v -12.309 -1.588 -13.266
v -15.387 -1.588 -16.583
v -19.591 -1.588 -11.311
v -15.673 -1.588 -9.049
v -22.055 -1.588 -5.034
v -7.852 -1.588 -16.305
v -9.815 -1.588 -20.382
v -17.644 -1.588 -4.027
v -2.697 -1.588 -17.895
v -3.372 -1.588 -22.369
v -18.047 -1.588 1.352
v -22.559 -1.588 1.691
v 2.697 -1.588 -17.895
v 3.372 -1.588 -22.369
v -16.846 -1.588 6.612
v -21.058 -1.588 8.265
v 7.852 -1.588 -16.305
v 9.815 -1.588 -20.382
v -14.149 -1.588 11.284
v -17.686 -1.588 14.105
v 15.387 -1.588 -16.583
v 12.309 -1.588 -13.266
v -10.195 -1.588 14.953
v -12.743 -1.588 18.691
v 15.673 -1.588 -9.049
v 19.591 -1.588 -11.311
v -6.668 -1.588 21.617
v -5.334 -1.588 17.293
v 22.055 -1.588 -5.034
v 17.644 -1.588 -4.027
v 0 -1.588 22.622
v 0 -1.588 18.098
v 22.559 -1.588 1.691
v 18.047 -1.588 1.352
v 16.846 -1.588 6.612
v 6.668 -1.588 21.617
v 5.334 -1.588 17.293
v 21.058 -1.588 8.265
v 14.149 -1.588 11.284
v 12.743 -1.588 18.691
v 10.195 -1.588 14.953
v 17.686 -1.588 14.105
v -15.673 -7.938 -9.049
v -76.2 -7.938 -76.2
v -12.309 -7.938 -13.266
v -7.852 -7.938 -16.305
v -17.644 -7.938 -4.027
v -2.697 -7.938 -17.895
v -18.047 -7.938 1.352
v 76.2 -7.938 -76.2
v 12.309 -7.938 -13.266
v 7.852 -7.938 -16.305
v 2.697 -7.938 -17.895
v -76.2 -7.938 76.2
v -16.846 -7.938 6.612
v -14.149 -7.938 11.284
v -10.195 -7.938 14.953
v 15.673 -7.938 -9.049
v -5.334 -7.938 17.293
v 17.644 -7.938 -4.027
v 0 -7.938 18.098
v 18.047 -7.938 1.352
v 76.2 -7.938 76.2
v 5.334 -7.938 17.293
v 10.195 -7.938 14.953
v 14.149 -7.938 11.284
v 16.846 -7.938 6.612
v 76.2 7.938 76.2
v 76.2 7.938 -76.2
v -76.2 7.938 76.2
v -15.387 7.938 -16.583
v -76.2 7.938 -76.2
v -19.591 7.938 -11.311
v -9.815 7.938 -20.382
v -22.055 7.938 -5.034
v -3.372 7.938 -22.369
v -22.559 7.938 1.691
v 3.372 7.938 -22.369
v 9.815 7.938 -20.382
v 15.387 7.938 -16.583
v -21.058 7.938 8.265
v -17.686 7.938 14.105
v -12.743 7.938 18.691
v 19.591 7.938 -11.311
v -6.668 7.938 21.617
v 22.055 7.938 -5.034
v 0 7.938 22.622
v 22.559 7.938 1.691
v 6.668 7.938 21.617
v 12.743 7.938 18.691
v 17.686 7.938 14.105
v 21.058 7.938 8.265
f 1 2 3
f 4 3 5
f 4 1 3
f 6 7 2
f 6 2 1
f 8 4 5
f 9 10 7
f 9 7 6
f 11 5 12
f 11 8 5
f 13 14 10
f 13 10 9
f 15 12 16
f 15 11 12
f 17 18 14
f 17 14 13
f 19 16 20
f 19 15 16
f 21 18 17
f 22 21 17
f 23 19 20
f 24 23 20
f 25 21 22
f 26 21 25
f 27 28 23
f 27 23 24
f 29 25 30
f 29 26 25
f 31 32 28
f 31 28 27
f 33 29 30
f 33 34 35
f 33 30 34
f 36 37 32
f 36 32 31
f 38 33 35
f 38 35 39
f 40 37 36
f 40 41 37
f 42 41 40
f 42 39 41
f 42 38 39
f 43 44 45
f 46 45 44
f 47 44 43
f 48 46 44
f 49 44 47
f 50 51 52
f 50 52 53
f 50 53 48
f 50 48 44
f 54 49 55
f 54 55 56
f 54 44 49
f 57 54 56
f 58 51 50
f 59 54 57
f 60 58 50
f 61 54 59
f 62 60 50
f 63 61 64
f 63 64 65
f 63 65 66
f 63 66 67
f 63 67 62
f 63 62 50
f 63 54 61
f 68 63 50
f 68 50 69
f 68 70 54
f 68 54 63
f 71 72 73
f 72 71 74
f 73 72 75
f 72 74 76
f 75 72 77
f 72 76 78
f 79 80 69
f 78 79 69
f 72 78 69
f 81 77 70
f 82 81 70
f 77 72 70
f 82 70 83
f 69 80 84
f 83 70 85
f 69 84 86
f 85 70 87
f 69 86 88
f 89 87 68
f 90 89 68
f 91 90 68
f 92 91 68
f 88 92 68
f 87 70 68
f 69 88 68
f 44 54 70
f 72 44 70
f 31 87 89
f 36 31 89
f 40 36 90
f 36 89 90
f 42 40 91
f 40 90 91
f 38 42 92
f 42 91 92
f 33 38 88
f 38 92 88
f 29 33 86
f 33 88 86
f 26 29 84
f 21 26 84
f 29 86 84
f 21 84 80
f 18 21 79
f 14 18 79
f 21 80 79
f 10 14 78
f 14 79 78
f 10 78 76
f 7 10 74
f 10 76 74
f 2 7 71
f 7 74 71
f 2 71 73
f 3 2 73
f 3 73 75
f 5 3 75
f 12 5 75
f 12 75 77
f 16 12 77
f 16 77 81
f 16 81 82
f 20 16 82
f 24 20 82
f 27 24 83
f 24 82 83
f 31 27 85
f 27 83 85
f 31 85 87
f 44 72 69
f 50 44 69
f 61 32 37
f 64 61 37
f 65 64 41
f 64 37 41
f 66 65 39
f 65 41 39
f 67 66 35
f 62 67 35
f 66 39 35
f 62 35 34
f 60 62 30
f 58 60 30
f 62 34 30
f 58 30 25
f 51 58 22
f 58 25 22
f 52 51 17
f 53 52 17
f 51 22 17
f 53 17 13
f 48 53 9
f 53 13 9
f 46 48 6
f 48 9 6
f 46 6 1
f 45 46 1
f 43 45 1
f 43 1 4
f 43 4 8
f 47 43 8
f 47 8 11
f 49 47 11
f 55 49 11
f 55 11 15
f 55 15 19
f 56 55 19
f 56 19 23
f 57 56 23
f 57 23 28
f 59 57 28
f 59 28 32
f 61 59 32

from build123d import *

# Parameters (mm, degrees)
SKETCH3_W           = 152.4
SKETCH3_H           = 15.875
BOSS_EXTRUDE1_DEPTH = 76.2
SKETCH4_R           = 22.621875
CUT_EXTRUDE1_DEPTH  = 9.525
SKETCH5_R           = 18.0975
CUT_EXTRUDE2_DEPTH  = 109.183203987


with BuildPart() as part:
    # Sketch3 → Boss-Extrude1 (new, symmetric)
    with BuildSketch(Plane.XY):
        Rectangle(SKETCH3_W, SKETCH3_H)
    extrude(amount=BOSS_EXTRUDE1_DEPTH, both=True)

    # Sketch4 → Cut-Extrude1 (cut)
    with BuildSketch(Plane(origin=(0, 7.9375, 0), x_dir=(1, 0, 0), z_dir=(0, 1, 0))):
        with Locations(Location((0, 0, 0), (0, 0, 270))):
            Circle(SKETCH4_R)
    extrude(amount=-CUT_EXTRUDE1_DEPTH, mode=Mode.SUBTRACT)

    # Sketch5 → Cut-Extrude2 (cut, through all)
    with BuildSketch(Plane(origin=(0, -1.5875, 0), x_dir=(1, 0, 0), z_dir=(0, 1, 0))):
        with Locations(Location((0, 0, 0), (0, 0, 270))):
            Circle(SKETCH5_R)
    extrude(amount=-CUT_EXTRUDE2_DEPTH, mode=Mode.SUBTRACT)


solid = part.part
